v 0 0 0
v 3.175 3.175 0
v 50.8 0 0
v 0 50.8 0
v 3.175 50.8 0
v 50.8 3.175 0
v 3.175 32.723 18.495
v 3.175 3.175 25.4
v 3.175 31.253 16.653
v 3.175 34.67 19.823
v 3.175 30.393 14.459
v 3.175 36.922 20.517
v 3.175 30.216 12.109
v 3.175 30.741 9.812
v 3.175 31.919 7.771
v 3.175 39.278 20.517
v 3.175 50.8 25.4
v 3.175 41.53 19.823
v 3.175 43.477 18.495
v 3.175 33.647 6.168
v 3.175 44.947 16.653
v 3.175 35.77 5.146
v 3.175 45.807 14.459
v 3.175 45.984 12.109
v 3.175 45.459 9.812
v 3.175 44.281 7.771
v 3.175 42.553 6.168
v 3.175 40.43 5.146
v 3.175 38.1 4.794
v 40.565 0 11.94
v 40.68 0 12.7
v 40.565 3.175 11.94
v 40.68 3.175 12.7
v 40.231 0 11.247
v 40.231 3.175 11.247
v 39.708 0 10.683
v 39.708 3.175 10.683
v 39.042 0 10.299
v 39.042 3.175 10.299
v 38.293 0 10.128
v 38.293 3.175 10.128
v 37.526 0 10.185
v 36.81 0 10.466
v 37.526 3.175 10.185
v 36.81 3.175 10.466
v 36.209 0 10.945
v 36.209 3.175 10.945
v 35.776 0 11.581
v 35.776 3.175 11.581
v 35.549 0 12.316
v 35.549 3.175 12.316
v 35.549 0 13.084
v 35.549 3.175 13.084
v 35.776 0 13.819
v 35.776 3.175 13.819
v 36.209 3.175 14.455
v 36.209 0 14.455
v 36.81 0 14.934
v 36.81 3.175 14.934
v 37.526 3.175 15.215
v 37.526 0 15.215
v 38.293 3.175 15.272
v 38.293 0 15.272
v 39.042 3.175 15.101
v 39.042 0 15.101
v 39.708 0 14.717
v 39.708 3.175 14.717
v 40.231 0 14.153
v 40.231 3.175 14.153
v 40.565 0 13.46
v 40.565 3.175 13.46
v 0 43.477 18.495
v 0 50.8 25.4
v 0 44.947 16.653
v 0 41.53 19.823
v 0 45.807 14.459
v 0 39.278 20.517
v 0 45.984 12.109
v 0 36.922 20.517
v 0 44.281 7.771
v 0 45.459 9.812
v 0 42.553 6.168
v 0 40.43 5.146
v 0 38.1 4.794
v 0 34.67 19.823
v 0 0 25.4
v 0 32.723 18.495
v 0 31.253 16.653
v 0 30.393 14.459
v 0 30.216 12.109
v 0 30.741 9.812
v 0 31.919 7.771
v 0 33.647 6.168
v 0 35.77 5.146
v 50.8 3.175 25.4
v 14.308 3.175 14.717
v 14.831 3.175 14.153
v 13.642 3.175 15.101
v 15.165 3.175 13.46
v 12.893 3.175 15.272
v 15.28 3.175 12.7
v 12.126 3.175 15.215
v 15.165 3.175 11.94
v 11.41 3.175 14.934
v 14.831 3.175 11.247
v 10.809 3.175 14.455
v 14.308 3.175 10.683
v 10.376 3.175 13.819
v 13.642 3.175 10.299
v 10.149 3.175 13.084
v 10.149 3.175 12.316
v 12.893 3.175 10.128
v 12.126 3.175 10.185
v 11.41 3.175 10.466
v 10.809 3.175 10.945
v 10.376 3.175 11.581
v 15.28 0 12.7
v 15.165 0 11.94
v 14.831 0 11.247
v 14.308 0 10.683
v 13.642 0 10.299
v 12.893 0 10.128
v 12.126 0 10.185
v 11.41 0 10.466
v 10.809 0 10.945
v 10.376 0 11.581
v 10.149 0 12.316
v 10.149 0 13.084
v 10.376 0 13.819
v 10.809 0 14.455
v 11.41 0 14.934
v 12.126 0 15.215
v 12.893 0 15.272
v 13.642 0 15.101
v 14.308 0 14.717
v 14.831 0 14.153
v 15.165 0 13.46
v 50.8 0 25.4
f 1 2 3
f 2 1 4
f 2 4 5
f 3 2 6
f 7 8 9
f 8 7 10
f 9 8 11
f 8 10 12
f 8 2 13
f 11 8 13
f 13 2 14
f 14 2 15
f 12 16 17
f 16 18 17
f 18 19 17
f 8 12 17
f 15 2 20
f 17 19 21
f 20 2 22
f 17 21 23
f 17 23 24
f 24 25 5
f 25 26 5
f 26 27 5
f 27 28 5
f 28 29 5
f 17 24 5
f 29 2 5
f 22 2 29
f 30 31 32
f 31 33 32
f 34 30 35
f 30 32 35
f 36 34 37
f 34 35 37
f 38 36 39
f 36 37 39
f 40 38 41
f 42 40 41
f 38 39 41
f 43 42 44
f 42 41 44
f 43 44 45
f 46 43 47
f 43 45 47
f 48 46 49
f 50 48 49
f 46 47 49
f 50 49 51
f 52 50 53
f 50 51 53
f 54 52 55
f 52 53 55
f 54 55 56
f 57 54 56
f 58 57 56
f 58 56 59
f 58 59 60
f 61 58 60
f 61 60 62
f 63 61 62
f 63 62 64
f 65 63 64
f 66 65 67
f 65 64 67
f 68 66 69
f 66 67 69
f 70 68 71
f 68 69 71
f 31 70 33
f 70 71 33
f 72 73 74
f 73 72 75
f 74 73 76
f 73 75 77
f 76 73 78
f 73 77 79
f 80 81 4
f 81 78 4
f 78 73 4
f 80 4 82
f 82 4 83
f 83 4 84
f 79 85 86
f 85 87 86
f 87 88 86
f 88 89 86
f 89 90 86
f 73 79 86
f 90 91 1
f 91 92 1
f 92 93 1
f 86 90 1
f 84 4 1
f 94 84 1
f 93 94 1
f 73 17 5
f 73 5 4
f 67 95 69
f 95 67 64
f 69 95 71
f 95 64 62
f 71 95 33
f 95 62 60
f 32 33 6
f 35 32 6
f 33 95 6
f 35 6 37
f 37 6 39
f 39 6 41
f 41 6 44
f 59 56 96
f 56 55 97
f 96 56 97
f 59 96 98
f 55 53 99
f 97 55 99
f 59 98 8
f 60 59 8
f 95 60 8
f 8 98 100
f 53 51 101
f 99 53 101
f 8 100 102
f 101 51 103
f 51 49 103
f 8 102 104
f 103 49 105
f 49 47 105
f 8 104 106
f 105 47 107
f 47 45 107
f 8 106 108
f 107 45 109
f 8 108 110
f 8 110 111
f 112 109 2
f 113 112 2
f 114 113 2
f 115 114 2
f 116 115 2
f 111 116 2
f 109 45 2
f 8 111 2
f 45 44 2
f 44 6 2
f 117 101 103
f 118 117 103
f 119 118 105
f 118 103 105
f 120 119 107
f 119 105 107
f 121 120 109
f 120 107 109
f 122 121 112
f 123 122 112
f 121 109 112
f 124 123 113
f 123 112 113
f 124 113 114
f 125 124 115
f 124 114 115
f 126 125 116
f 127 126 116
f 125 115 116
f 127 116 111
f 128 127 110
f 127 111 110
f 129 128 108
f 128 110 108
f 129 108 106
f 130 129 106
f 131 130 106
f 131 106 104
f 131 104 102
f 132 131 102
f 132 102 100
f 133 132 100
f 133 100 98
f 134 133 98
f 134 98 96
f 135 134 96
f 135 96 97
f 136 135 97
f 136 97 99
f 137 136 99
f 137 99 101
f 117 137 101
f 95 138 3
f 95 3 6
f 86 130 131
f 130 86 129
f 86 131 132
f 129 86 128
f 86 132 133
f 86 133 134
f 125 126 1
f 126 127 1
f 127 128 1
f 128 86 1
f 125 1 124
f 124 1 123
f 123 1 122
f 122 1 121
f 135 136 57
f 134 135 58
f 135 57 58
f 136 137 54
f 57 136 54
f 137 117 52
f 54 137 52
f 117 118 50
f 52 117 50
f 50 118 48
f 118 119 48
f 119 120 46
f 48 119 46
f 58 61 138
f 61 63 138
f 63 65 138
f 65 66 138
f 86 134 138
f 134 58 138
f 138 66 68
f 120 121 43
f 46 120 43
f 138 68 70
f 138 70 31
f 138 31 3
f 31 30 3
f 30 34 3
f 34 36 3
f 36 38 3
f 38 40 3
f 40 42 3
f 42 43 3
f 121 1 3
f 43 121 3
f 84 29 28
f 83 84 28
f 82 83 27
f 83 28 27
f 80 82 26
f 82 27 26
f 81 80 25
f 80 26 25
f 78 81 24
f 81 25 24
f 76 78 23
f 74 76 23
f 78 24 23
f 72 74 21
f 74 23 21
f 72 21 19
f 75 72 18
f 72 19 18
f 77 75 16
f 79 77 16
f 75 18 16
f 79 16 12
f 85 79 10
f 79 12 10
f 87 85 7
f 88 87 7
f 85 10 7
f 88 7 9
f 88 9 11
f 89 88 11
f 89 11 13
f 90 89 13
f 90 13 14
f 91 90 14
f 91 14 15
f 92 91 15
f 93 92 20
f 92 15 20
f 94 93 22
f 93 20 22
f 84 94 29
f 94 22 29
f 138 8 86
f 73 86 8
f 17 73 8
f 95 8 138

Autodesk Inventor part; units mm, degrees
ref_plane "YZ Plane" through (0, 0, 0) normal (1, 0, 0) x (0, 1, 0)
ref_plane "XZ Plane" through (0, 0, 0) normal (0, 1, 0) x (-1, 0, 0)
ref_plane "XY Plane" through (0, 0, 0) normal (0, 0, 1) x (1, 0, 0)
sketch "Sketch1" plane through (0, 0, 0) normal (0, 0, 1) x (1, 0, 0)
  line L0 (0, 0) -> (3.175, 0)
  line L1 (3.175, 0) -> (3.175, 50.8)
  line L2 (3.175, 50.8) -> (0, 50.8)
  line L3 (0, 50.8) -> (0, 0)
  line L4 (0, 0) -> (50.8, 0)
  line L5 (50.8, 0) -> (50.8, 3.175)
  line L6 (50.8, 3.175) -> (0, 3.175)
  line L7 (0, 3.175) -> (0, 0)
  dimension "d0" = 3.175
  dimension "d1" = 50.8
  dimension "d2" = 50.8
  dimension "d3" = 3.175
extrude "Extrusion1" add sketch "Sketch1" along normal blind 25.4
sketch "Sketch2" plane through (3.175, 3.175, 0) normal (1, 0, 0) x (0, 0, -1)
  line L0 (0, 47.625) -> (-25.4, 47.625) projected
  line L1 (-12.7, 47.625) -> (-12.7, 22.225)
  circle A0 centre (-12.7, 34.925) radius 7.9057
  point P0 (0, -3.175)
  dimension "d6" = 25.4
  dimension "d7" = 15.8115
extrude "Extrusion2" cut sketch "Sketch2" against normal blind 25.4
sketch "Sketch3" plane through (3.175, 3.175, 0) normal (0, 1, 0) x (1, 0, 0)
  line L0 (47.625, 0) -> (47.625, -25.4) construction
  line L1 (47.625, -12.7) -> (34.925, -12.7) construction
  line L2 (47.625, -12.7) -> (60.325, -12.7) construction
  circle A0 centre (34.925, -12.7) radius 2.5797
  line L3 (34.925, -12.7) -> (9.525, -12.7) construction
  circle A1 centre (9.525, -12.7) radius 2.5797
  point P0 (-3.175, 0)
  dimension "d10" = 12.7
  dimension "d11" = 180
  dimension "d12" = 5.1594
  dimension "d15" = 25.4
extrude "Extrusion4" cut sketch "Sketch3" against normal blind 25.4
properties part number "Piston bracket"
